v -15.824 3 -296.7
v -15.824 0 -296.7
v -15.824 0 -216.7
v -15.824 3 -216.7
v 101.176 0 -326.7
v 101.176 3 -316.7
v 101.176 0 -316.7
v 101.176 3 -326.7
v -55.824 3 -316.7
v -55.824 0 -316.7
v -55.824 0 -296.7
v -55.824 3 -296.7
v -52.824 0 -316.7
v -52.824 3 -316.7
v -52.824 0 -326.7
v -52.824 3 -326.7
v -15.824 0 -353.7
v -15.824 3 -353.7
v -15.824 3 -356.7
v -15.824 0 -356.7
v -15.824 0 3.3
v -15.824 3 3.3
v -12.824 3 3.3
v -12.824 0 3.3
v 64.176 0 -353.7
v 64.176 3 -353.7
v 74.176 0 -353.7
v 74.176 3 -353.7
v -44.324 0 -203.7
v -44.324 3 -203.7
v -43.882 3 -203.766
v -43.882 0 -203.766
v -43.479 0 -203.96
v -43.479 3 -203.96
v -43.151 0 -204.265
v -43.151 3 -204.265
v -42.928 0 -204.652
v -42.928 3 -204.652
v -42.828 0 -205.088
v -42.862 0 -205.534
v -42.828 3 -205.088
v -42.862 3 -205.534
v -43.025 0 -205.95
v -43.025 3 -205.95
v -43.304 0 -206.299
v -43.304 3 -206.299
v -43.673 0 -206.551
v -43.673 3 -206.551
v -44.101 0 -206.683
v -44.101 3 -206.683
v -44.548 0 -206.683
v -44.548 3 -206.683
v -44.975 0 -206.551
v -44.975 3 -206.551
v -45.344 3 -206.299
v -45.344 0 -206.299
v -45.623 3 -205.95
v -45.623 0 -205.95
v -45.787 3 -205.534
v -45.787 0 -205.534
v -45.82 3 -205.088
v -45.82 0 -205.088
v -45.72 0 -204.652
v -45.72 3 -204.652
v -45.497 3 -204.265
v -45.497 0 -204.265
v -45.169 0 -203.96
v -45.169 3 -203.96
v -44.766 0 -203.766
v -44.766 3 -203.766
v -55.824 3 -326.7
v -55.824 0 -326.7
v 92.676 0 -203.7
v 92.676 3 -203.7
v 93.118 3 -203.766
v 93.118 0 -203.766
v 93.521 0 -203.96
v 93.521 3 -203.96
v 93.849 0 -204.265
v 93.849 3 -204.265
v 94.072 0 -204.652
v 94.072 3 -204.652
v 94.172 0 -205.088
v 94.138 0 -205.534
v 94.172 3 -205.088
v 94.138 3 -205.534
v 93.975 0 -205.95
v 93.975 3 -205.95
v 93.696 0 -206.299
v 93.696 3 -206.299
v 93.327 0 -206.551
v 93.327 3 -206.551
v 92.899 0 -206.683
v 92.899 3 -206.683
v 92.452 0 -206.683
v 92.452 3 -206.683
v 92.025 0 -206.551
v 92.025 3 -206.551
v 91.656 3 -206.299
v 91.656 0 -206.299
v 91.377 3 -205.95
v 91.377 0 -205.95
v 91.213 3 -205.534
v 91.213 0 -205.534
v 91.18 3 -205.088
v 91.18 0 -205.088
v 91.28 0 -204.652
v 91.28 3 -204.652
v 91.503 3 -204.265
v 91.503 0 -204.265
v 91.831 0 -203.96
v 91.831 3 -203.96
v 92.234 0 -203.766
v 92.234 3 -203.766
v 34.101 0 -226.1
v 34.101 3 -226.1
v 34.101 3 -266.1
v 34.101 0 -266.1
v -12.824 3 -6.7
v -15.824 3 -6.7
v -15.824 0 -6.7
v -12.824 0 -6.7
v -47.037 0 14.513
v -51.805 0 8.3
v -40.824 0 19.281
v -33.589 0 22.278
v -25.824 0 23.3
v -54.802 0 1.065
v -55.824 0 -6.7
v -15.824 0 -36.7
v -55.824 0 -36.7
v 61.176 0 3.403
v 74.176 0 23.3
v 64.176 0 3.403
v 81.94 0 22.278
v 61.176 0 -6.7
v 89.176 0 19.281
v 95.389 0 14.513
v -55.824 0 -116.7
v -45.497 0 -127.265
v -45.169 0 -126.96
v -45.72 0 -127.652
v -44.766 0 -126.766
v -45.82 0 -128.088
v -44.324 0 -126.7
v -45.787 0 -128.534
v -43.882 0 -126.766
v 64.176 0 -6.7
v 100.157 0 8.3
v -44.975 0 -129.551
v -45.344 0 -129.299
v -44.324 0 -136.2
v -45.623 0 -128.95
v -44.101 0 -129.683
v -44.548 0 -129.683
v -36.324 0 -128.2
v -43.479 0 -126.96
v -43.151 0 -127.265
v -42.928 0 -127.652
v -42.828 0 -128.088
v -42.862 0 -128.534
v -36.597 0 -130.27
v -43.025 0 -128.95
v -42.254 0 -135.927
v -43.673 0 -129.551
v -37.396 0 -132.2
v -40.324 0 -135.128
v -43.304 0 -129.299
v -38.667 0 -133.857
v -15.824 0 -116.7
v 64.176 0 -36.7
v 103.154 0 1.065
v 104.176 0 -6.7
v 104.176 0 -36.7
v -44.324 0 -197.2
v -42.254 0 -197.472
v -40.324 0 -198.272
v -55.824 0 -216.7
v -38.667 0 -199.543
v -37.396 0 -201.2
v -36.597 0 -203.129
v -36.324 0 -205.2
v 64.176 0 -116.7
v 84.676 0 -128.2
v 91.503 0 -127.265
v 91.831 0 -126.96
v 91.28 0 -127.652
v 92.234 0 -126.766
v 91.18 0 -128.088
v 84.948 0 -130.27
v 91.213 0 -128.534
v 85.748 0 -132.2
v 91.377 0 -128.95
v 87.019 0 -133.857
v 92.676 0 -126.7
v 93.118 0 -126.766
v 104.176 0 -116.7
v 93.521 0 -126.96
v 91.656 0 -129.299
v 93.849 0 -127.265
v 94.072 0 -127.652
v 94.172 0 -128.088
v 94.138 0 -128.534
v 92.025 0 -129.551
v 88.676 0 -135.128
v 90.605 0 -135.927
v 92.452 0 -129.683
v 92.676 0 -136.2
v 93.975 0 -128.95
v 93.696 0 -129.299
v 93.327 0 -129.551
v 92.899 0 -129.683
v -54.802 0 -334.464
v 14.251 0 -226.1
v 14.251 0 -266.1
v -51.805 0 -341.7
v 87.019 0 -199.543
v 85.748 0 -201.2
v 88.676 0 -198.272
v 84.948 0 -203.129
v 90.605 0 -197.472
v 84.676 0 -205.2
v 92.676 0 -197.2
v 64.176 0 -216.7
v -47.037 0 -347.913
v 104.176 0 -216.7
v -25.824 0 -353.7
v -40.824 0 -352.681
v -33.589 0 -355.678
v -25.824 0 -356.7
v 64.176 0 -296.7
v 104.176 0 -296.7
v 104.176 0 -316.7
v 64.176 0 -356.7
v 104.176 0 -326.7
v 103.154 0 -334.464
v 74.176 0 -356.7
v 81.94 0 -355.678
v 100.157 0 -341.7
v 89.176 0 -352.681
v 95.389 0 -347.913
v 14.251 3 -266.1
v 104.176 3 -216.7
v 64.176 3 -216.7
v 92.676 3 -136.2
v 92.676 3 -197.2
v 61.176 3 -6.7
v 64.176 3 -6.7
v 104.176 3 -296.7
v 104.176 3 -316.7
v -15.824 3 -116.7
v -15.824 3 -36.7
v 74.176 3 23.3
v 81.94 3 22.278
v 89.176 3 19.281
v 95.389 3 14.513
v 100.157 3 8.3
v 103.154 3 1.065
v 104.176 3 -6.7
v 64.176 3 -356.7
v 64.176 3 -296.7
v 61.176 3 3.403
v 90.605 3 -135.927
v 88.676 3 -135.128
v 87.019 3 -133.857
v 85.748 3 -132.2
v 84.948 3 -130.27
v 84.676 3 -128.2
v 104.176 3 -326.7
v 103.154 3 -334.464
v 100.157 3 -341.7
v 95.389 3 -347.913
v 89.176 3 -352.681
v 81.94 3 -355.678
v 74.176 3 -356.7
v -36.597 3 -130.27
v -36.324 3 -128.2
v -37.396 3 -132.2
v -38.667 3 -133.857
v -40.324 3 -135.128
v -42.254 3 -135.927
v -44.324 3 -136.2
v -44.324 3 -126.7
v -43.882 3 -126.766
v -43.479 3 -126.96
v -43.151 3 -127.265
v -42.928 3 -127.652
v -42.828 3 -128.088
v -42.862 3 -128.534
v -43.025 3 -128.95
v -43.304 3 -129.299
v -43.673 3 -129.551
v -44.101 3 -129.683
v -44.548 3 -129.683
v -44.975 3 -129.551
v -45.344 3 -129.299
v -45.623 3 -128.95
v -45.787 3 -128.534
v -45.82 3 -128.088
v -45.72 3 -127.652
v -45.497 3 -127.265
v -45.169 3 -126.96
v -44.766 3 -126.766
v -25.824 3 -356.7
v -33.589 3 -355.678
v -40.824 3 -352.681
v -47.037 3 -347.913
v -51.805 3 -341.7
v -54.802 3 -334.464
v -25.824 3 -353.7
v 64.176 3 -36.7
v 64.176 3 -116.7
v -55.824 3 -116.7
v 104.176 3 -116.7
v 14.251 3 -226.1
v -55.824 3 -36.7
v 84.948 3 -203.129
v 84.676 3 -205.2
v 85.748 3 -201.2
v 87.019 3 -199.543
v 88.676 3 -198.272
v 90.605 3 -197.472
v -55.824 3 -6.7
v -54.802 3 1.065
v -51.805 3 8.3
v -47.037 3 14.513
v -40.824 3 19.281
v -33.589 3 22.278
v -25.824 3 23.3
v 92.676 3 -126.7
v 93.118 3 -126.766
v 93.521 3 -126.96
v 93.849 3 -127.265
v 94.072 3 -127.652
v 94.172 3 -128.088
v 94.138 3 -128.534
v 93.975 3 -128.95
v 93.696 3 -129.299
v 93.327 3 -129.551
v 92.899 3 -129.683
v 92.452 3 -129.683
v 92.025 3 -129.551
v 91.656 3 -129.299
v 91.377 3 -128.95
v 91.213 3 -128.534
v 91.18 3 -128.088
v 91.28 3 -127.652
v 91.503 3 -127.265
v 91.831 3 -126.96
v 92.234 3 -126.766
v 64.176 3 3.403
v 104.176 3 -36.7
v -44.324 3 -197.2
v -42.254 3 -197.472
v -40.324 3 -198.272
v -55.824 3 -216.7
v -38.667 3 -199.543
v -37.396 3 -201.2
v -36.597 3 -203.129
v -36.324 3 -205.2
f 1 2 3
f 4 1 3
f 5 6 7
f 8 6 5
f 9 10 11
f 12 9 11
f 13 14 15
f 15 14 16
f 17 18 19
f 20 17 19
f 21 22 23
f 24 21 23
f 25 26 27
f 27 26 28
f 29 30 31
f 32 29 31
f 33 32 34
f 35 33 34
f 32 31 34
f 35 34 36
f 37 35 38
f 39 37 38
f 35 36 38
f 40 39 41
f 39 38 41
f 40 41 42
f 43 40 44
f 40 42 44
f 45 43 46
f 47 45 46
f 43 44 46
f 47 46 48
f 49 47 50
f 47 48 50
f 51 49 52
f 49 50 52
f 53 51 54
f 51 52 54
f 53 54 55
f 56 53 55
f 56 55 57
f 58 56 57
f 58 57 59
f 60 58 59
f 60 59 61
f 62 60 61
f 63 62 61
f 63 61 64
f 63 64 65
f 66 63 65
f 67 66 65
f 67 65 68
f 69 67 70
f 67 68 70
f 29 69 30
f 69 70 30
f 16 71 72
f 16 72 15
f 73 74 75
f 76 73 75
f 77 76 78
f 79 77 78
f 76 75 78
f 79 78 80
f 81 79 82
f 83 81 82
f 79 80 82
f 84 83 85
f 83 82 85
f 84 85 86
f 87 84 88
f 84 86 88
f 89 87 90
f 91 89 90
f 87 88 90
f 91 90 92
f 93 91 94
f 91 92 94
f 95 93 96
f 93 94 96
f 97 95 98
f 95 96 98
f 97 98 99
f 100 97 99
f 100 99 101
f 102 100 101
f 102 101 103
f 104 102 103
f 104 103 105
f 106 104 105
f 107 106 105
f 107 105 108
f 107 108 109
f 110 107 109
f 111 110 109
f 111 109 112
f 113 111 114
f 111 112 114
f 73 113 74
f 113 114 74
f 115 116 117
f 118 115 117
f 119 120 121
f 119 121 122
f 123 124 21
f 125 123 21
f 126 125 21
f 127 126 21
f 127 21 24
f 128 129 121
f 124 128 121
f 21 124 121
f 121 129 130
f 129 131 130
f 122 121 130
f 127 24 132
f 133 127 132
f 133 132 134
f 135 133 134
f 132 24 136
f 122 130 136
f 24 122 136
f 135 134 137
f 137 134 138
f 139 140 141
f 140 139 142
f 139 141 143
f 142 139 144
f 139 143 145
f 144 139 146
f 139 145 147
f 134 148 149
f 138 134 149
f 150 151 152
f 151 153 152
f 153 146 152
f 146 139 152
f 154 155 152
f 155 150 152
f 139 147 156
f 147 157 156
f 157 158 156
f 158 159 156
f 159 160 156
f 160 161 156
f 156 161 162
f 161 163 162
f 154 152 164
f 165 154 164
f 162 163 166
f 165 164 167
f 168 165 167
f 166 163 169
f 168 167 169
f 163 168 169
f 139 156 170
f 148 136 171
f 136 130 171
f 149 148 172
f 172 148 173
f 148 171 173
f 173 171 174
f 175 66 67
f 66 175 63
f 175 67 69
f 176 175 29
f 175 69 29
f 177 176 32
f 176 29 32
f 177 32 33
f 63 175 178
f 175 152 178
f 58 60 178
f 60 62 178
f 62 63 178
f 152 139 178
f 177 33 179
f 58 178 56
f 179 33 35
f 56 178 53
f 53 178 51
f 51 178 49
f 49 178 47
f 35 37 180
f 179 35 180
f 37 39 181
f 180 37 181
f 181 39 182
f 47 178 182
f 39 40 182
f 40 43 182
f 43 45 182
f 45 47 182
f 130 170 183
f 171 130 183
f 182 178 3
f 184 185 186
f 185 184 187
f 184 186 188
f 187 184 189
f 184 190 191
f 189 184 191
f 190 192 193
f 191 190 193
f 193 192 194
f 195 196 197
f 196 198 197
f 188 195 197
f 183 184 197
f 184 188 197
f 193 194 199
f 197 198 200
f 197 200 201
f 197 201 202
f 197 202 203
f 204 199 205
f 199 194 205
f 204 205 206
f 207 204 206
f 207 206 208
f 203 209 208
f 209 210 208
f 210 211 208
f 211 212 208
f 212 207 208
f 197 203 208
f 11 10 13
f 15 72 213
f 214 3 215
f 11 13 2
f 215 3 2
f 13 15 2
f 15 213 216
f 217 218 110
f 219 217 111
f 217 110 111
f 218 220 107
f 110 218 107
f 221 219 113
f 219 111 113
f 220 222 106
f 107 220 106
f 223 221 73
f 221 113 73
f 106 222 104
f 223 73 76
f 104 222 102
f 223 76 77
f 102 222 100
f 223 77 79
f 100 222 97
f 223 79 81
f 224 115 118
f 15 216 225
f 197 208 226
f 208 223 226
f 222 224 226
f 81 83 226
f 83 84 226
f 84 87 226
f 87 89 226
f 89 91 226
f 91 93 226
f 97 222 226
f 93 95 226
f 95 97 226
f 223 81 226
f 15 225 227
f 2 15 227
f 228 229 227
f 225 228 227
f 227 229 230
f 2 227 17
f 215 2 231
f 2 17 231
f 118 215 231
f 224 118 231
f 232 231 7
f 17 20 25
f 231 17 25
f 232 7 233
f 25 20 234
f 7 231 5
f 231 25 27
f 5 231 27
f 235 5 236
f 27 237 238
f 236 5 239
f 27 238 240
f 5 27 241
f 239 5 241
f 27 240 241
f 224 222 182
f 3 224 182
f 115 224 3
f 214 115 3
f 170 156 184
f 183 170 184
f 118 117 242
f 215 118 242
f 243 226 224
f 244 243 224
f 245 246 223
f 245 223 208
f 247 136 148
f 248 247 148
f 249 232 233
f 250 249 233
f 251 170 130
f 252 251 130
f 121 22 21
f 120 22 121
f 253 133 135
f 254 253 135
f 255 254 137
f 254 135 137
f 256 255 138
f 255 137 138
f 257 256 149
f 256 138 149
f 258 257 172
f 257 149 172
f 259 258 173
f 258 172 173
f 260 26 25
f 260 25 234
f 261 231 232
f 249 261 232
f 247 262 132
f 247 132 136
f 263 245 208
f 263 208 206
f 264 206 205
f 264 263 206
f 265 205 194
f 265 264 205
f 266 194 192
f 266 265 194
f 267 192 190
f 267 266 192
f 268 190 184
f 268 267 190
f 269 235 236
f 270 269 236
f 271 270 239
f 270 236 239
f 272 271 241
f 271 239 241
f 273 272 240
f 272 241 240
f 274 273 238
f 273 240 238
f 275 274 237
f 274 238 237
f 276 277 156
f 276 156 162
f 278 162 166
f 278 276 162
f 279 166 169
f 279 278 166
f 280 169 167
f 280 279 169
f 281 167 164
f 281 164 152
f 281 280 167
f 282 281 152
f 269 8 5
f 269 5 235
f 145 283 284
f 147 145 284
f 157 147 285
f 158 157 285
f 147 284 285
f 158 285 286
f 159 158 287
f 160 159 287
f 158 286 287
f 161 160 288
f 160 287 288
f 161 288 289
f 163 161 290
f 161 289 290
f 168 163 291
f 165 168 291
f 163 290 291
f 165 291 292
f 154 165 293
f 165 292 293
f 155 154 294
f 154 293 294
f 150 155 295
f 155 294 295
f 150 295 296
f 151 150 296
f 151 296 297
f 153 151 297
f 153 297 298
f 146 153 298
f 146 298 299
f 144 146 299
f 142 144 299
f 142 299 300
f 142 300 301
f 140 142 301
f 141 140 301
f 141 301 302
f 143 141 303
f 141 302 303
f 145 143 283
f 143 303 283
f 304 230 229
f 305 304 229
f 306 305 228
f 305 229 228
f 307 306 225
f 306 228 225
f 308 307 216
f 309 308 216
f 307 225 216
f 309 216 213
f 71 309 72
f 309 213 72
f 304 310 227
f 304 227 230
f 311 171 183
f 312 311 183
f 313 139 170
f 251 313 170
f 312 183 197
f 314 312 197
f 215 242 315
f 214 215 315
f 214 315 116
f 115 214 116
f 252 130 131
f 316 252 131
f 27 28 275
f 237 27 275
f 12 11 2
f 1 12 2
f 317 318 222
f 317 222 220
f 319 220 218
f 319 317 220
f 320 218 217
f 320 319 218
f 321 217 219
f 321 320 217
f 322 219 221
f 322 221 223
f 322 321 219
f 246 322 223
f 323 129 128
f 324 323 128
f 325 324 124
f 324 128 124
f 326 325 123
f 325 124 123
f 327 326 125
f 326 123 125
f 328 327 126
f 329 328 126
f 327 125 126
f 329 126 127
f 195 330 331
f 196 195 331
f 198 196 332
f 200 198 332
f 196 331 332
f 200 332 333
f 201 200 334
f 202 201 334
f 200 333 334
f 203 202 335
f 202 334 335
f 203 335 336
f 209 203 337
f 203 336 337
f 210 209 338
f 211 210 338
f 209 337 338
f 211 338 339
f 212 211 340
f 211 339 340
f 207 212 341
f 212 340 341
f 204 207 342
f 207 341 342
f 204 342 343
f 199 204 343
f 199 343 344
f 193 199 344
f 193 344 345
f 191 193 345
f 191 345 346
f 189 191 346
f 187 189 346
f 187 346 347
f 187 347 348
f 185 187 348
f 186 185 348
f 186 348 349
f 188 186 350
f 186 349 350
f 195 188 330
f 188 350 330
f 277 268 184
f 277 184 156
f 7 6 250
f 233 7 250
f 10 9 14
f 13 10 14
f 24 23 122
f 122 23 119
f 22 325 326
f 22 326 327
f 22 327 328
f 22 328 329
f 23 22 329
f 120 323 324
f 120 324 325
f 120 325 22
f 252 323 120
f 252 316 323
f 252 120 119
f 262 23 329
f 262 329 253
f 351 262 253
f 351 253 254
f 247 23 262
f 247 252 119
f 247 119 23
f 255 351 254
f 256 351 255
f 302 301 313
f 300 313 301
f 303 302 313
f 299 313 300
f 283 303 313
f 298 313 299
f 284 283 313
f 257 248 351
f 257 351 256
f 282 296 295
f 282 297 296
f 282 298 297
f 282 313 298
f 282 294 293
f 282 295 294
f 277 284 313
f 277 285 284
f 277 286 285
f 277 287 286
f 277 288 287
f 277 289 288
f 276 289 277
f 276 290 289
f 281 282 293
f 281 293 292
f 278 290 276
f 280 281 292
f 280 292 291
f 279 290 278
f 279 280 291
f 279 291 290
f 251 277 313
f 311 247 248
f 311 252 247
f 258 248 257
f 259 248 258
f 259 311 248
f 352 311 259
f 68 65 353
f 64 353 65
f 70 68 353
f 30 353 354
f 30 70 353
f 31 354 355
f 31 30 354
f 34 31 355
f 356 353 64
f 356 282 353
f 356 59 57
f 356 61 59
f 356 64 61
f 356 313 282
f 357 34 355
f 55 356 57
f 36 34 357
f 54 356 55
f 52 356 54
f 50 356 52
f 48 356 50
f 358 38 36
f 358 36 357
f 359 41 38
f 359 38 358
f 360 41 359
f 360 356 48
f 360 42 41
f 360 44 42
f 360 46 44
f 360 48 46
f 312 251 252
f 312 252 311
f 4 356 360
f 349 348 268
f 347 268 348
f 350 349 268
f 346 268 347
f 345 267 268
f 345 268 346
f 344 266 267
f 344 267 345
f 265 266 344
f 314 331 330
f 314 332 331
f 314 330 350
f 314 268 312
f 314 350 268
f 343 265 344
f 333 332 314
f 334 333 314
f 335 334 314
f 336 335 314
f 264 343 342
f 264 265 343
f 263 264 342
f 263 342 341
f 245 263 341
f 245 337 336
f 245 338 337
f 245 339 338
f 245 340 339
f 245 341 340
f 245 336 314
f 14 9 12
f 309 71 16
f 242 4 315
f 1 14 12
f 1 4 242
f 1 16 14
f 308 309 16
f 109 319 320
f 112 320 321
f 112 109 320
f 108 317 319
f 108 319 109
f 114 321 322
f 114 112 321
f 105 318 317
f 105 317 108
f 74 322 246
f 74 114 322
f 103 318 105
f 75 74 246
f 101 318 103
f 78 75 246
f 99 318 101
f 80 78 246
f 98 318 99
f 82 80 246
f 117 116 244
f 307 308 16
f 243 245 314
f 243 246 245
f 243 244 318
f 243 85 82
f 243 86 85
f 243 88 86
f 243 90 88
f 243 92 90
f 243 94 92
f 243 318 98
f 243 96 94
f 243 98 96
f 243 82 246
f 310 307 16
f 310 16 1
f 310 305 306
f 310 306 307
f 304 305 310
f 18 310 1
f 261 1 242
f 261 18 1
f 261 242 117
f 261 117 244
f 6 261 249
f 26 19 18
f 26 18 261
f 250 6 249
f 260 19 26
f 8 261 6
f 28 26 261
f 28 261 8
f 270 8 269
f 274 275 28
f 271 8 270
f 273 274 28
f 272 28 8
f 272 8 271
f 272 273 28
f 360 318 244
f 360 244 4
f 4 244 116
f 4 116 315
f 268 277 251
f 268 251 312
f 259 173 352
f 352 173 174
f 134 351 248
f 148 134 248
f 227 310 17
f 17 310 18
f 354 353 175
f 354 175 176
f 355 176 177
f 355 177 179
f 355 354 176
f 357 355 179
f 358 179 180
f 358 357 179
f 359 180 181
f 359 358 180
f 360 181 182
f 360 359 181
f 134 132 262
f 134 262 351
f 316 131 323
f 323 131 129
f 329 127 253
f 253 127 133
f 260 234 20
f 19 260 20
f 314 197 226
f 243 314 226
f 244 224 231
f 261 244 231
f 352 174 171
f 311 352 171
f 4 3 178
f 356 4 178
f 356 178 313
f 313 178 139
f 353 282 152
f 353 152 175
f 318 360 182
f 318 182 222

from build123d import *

# Parameters (mm, degrees)
RESSALTO_EXTRUS_O1_DEPTH = 3
ESBO_O2_R                = 1.5
ESBO_O2_W                = 3
ESBO_O2_H                = 10
ESBO_O2_W_2              = 10
ESBO_O2_H_2              = 3
ESBO_O2_H_3              = 10.102691272
CORTE_EXTRUS_O2_DEPTH    = 3


with BuildPart() as part:
    # Esboço1 → Ressalto-extrusão1 (new body)
    with BuildSketch(Plane(origin=(0, 0, 0), x_dir=(1, 0, 0), z_dir=(0, 1, 0))):
        with BuildLine():
            Line((-25.82411142, -23.300209544), (74.17588858, -23.300209544))
            ThreePointArc((74.17588858, -23.300209544), (95.389092016, -14.513412979), (104.17588858, 6.699790456))
            Line((104.17588858, 6.699790456), (104.17588858, 36.699790456))
            Line((104.17588858, 36.699790456), (64.17588858, 36.699790456))
            Line((64.17588858, 36.699790456), (64.17588858, 116.699790456))
            Line((64.17588858, 116.699790456), (104.17588858, 116.699790456))
            Line((104.17588858, 116.699790456), (104.17588858, 216.699790456))
            Line((104.17588858, 216.699790456), (64.17588858, 216.699790456))
            Line((64.17588858, 216.699790456), (64.17588858, 296.699790456))
            Line((64.17588858, 296.699790456), (104.17588858, 296.699790456))
            Line((104.17588858, 296.699790456), (104.17588858, 326.699790456))
            ThreePointArc((104.17588858, 326.699790456), (95.389092016, 347.912993892), (74.17588858, 356.699790456))
            Line((74.17588858, 356.699790456), (-25.82411142, 356.699790456))
            ThreePointArc((-25.82411142, 356.699790456), (-47.037314855, 347.912993892), (-55.82411142, 326.699790456))
            Line((-55.82411142, 326.699790456), (-55.82411142, 296.699790456))
            Line((-55.82411142, 296.699790456), (-15.82411142, 296.699790456))
            Line((-15.82411142, 296.699790456), (-15.82411142, 216.699790456))
            Line((-15.82411142, 216.699790456), (-55.82411142, 216.699790456))
            Line((-55.82411142, 216.699790456), (-55.82411142, 116.699790456))
            Line((-55.82411142, 116.699790456), (-15.82411142, 116.699790456))
            Line((-15.82411142, 116.699790456), (-15.82411142, 36.699790456))
            Line((-15.82411142, 36.699790456), (-55.82411142, 36.699790456))
            Line((-55.82411142, 36.699790456), (-55.82411142, 6.699790456))
            ThreePointArc((-55.82411142, 6.699790456), (-47.037314855, -14.513412979), (-25.82411142, -23.300209544))
        make_face()
    extrude(amount=RESSALTO_EXTRUS_O1_DEPTH)

    # Esboço2 → Corte-extrusão2 (cut)
    with BuildSketch(Plane(origin=(0, 3, 0), x_dir=(1, 0, 0), z_dir=(0, 1, 0))):
        with Locations(Location((-44.32411142, 205.199790456, 0), (0, 0, 270))):
            Circle(ESBO_O2_R)
        with Locations(Location((-44.32411142, 128.199790456, 0), (0, 0, 270))):
            Circle(ESBO_O2_R)
        with Locations(Location((92.67588858, 128.199790456, 0), (0, 0, 270))):
            Circle(ESBO_O2_R)
        with Locations(Location((92.67588858, 205.199790456, 0), (0, 0, 270))):
            Circle(ESBO_O2_R)
        with Locations((102.67588858, 321.699790456)):
            Rectangle(ESBO_O2_W, ESBO_O2_H)
        with Locations((69.17588858, 355.199790456)):
            Rectangle(ESBO_O2_W_2, ESBO_O2_H_2)
        with BuildLine():
            Line((-36.32411142, 205.199790456), (84.67588858, 205.199790456))
            ThreePointArc((84.67588858, 205.199790456), (87.019034331, 199.542936207), (92.67588858, 197.199790456))
            Line((92.67588858, 197.199790456), (92.67588858, 136.199790456))
            ThreePointArc((92.67588858, 136.199790456), (87.019034331, 133.856644706), (84.67588858, 128.199790456))
            Line((84.67588858, 128.199790456), (-36.32411142, 128.199790456))
            ThreePointArc((-36.32411142, 128.199790456), (-38.66725717, 133.856644706), (-44.32411142, 136.199790456))
            Line((-44.32411142, 136.199790456), (-44.32411142, 197.199790456))
            ThreePointArc((-44.32411142, 197.199790456), (-38.66725717, 199.542936207), (-36.32411142, 205.199790456))
        make_face()
        with Locations((-14.32411142, 1.699790456)):
            Rectangle(ESBO_O2_W, ESBO_O2_H)
        with Locations((62.67588858, 1.64844482)):
            Rectangle(ESBO_O2_W, ESBO_O2_H_3)
        with Locations((-20.82411142, 355.199790456)):
            Rectangle(ESBO_O2_W_2, ESBO_O2_H_2)
        with Locations((-54.32411142, 321.699790456)):
            Rectangle(ESBO_O2_W, ESBO_O2_H)
        Polygon((34.10088858, 256.699790456), (34.10088858, 266.099790456), (14.25088858, 266.099790456), (14.25088858, 256.699790456), (14.25088858, 226.099790456), (34.10088858, 226.099790456), align=None)
    extrude(amount=-CORTE_EXTRUS_O2_DEPTH, mode=Mode.SUBTRACT)


solid = part.part
